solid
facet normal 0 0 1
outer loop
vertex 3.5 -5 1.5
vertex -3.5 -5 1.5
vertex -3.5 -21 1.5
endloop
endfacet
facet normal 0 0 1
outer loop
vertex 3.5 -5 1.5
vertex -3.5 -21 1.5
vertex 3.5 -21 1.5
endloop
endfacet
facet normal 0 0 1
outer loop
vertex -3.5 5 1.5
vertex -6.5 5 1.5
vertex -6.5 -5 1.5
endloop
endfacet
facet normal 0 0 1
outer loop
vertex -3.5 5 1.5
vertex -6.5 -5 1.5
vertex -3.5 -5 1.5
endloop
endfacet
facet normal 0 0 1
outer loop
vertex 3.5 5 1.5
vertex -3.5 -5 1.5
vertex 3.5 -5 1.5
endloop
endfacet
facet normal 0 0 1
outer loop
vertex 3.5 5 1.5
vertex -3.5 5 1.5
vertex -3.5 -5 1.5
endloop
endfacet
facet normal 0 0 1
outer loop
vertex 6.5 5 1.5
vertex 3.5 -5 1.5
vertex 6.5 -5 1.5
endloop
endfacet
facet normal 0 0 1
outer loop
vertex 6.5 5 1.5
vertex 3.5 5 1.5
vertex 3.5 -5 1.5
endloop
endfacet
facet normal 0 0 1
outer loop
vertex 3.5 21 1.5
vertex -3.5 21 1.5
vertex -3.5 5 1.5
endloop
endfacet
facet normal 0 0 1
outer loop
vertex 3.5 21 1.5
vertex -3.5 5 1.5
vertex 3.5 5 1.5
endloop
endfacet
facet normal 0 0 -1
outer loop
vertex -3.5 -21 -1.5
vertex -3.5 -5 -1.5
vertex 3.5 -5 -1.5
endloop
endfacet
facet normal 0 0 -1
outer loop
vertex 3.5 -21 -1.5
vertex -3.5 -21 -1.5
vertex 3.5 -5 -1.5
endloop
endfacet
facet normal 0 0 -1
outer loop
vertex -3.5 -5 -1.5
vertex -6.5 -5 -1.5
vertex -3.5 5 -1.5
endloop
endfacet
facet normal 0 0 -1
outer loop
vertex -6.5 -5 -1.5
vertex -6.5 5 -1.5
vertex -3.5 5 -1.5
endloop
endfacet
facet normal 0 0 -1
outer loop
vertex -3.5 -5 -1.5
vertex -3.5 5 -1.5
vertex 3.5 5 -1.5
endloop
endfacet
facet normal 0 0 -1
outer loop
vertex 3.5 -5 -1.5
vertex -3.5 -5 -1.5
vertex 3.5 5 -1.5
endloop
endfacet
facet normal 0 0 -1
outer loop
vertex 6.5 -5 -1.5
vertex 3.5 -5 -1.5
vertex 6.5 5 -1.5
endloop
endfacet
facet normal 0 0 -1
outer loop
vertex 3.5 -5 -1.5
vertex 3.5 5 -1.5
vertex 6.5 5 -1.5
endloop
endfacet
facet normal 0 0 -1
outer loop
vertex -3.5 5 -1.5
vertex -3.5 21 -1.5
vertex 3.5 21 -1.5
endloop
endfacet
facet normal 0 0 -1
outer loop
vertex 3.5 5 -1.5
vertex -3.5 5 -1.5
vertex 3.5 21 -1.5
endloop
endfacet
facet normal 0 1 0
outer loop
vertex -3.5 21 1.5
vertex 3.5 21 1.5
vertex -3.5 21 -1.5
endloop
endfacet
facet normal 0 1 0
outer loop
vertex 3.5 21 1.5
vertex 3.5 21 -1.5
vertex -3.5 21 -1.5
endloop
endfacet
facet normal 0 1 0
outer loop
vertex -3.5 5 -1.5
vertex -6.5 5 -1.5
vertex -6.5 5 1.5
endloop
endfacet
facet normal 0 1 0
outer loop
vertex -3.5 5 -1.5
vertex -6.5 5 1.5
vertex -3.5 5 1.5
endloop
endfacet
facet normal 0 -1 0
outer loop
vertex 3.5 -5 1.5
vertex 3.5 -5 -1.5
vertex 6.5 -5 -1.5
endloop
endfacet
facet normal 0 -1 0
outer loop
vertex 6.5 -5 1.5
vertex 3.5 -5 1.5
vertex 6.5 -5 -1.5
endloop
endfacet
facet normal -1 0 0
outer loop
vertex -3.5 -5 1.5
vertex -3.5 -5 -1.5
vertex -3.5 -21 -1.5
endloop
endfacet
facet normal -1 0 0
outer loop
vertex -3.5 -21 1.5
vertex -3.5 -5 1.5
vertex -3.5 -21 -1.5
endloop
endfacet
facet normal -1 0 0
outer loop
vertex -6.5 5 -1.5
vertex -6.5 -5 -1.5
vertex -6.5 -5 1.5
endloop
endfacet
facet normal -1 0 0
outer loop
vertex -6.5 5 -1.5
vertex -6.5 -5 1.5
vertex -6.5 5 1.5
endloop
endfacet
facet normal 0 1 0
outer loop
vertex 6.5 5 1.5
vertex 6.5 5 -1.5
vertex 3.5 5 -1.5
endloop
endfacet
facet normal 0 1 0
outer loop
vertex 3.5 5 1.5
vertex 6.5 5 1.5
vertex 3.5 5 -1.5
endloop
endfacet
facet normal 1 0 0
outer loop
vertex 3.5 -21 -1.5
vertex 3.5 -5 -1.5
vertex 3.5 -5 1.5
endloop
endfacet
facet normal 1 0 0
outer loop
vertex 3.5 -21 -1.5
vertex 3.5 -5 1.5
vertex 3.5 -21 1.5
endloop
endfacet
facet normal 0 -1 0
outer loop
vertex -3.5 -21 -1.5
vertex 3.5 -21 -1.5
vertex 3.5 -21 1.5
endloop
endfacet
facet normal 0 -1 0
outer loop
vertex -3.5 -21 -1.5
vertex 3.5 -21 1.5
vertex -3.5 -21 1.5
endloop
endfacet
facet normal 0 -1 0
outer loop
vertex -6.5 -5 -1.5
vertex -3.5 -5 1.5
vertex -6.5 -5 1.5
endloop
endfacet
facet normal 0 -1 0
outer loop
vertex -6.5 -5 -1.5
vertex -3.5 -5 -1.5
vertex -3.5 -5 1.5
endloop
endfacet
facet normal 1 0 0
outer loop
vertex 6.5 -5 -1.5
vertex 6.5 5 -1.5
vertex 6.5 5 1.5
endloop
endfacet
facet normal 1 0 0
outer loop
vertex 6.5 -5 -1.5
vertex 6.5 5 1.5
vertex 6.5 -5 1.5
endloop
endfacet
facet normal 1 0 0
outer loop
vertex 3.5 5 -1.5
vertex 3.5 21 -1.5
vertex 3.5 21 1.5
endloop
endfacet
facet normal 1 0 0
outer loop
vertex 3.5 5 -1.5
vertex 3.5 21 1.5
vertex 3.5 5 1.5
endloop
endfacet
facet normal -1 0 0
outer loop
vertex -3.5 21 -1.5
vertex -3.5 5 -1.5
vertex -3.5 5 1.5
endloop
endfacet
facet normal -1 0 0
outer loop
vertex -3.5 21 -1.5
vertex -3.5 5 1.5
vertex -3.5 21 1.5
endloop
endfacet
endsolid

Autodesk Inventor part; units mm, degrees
ref_plane "YZ Plane" through (0, 0, 0) normal (1, 0, 0) x (0, 1, 0)
ref_plane "XZ Plane" through (0, 0, 0) normal (0, 1, 0) x (-1, 0, 0)
ref_plane "XY Plane" through (0, 0, 0) normal (0, 0, 1) x (1, 0, 0)
sketch "Sketch1" plane through (0, 0, 0) normal (0, 0, 1) x (1, 0, 0)
  line L0 (-6.5, 24) -> (6.5, 24)
  line L1 (6.5, 24) -> (6.5, -24)
  line L2 (6.5, -24) -> (-6.5, -24)
  line L3 (-6.5, -24) -> (-6.5, 24)
  line L4 (-6.5, 5) -> (-3.5, 5)
  line L5 (-3.5, 5) -> (-3.5, -5)
  line L6 (-3.5, -5) -> (-6.5, -5)
  line L7 (-6.5, -5) -> (-6.5, 5)
  line L8 (-3.5, 24) -> (3.5, 24)
  line L9 (3.5, 24) -> (3.5, 21)
  line L10 (3.5, 21) -> (-3.5, 21)
  line L11 (-3.5, 21) -> (-3.5, 24)
  line L12 (0, 0) -> (0.5, 0)
  line L13 (0, 0) -> (0, -2.6489)
  line L14 (6.5, 5) -> (3.5, 5)
  line L15 (3.5, 5) -> (3.5, -5)
  line L16 (3.5, -5) -> (6.5, -5)
  line L17 (3.5, -24) -> (3.5, -21)
  line L18 (3.5, -21) -> (-3.5, -21)
  line L19 (-3.5, -21) -> (-3.5, -24)
  line L20 (-3.5, -5) -> (-3.5, -24)
  line L21 (-3.5, 5) -> (-3.5, 24)
  line L22 (3.5, 24) -> (3.5, 5)
  line L23 (3.5, -5) -> (3.5, -24)
  point P0 (0, 24)
  point P1 (6.5, 0)
  point P2 (-3.5, 0)
  point P3 (0, 21)
  point P4 (0, -21)
  point P5 (6.5, 5)
  point P6 (6.5, -5)
  point P7 (3.5, 21)
  point P8 (3.5, -21)
  point P9 (3.5, 21)
  point P10 (-3.5, 21)
  point P11 (-3.5, -21)
  point P12 (3.5, -21)
  dimension "d0" = 48
  dimension "d1" = 13
  dimension "d2" = 3
  dimension "d3" = 10
  dimension "d4" = 7
  dimension "d5" = 3
extrude "Extrusion1" add sketch "Sketch1" along normal mid plane 3 contours L4 L5 L6 L3 | L10 L22 L15 L23 L18 L20 L5 L21 | L1 L16 L15 L14
properties part number "Side piece 2 2x"
